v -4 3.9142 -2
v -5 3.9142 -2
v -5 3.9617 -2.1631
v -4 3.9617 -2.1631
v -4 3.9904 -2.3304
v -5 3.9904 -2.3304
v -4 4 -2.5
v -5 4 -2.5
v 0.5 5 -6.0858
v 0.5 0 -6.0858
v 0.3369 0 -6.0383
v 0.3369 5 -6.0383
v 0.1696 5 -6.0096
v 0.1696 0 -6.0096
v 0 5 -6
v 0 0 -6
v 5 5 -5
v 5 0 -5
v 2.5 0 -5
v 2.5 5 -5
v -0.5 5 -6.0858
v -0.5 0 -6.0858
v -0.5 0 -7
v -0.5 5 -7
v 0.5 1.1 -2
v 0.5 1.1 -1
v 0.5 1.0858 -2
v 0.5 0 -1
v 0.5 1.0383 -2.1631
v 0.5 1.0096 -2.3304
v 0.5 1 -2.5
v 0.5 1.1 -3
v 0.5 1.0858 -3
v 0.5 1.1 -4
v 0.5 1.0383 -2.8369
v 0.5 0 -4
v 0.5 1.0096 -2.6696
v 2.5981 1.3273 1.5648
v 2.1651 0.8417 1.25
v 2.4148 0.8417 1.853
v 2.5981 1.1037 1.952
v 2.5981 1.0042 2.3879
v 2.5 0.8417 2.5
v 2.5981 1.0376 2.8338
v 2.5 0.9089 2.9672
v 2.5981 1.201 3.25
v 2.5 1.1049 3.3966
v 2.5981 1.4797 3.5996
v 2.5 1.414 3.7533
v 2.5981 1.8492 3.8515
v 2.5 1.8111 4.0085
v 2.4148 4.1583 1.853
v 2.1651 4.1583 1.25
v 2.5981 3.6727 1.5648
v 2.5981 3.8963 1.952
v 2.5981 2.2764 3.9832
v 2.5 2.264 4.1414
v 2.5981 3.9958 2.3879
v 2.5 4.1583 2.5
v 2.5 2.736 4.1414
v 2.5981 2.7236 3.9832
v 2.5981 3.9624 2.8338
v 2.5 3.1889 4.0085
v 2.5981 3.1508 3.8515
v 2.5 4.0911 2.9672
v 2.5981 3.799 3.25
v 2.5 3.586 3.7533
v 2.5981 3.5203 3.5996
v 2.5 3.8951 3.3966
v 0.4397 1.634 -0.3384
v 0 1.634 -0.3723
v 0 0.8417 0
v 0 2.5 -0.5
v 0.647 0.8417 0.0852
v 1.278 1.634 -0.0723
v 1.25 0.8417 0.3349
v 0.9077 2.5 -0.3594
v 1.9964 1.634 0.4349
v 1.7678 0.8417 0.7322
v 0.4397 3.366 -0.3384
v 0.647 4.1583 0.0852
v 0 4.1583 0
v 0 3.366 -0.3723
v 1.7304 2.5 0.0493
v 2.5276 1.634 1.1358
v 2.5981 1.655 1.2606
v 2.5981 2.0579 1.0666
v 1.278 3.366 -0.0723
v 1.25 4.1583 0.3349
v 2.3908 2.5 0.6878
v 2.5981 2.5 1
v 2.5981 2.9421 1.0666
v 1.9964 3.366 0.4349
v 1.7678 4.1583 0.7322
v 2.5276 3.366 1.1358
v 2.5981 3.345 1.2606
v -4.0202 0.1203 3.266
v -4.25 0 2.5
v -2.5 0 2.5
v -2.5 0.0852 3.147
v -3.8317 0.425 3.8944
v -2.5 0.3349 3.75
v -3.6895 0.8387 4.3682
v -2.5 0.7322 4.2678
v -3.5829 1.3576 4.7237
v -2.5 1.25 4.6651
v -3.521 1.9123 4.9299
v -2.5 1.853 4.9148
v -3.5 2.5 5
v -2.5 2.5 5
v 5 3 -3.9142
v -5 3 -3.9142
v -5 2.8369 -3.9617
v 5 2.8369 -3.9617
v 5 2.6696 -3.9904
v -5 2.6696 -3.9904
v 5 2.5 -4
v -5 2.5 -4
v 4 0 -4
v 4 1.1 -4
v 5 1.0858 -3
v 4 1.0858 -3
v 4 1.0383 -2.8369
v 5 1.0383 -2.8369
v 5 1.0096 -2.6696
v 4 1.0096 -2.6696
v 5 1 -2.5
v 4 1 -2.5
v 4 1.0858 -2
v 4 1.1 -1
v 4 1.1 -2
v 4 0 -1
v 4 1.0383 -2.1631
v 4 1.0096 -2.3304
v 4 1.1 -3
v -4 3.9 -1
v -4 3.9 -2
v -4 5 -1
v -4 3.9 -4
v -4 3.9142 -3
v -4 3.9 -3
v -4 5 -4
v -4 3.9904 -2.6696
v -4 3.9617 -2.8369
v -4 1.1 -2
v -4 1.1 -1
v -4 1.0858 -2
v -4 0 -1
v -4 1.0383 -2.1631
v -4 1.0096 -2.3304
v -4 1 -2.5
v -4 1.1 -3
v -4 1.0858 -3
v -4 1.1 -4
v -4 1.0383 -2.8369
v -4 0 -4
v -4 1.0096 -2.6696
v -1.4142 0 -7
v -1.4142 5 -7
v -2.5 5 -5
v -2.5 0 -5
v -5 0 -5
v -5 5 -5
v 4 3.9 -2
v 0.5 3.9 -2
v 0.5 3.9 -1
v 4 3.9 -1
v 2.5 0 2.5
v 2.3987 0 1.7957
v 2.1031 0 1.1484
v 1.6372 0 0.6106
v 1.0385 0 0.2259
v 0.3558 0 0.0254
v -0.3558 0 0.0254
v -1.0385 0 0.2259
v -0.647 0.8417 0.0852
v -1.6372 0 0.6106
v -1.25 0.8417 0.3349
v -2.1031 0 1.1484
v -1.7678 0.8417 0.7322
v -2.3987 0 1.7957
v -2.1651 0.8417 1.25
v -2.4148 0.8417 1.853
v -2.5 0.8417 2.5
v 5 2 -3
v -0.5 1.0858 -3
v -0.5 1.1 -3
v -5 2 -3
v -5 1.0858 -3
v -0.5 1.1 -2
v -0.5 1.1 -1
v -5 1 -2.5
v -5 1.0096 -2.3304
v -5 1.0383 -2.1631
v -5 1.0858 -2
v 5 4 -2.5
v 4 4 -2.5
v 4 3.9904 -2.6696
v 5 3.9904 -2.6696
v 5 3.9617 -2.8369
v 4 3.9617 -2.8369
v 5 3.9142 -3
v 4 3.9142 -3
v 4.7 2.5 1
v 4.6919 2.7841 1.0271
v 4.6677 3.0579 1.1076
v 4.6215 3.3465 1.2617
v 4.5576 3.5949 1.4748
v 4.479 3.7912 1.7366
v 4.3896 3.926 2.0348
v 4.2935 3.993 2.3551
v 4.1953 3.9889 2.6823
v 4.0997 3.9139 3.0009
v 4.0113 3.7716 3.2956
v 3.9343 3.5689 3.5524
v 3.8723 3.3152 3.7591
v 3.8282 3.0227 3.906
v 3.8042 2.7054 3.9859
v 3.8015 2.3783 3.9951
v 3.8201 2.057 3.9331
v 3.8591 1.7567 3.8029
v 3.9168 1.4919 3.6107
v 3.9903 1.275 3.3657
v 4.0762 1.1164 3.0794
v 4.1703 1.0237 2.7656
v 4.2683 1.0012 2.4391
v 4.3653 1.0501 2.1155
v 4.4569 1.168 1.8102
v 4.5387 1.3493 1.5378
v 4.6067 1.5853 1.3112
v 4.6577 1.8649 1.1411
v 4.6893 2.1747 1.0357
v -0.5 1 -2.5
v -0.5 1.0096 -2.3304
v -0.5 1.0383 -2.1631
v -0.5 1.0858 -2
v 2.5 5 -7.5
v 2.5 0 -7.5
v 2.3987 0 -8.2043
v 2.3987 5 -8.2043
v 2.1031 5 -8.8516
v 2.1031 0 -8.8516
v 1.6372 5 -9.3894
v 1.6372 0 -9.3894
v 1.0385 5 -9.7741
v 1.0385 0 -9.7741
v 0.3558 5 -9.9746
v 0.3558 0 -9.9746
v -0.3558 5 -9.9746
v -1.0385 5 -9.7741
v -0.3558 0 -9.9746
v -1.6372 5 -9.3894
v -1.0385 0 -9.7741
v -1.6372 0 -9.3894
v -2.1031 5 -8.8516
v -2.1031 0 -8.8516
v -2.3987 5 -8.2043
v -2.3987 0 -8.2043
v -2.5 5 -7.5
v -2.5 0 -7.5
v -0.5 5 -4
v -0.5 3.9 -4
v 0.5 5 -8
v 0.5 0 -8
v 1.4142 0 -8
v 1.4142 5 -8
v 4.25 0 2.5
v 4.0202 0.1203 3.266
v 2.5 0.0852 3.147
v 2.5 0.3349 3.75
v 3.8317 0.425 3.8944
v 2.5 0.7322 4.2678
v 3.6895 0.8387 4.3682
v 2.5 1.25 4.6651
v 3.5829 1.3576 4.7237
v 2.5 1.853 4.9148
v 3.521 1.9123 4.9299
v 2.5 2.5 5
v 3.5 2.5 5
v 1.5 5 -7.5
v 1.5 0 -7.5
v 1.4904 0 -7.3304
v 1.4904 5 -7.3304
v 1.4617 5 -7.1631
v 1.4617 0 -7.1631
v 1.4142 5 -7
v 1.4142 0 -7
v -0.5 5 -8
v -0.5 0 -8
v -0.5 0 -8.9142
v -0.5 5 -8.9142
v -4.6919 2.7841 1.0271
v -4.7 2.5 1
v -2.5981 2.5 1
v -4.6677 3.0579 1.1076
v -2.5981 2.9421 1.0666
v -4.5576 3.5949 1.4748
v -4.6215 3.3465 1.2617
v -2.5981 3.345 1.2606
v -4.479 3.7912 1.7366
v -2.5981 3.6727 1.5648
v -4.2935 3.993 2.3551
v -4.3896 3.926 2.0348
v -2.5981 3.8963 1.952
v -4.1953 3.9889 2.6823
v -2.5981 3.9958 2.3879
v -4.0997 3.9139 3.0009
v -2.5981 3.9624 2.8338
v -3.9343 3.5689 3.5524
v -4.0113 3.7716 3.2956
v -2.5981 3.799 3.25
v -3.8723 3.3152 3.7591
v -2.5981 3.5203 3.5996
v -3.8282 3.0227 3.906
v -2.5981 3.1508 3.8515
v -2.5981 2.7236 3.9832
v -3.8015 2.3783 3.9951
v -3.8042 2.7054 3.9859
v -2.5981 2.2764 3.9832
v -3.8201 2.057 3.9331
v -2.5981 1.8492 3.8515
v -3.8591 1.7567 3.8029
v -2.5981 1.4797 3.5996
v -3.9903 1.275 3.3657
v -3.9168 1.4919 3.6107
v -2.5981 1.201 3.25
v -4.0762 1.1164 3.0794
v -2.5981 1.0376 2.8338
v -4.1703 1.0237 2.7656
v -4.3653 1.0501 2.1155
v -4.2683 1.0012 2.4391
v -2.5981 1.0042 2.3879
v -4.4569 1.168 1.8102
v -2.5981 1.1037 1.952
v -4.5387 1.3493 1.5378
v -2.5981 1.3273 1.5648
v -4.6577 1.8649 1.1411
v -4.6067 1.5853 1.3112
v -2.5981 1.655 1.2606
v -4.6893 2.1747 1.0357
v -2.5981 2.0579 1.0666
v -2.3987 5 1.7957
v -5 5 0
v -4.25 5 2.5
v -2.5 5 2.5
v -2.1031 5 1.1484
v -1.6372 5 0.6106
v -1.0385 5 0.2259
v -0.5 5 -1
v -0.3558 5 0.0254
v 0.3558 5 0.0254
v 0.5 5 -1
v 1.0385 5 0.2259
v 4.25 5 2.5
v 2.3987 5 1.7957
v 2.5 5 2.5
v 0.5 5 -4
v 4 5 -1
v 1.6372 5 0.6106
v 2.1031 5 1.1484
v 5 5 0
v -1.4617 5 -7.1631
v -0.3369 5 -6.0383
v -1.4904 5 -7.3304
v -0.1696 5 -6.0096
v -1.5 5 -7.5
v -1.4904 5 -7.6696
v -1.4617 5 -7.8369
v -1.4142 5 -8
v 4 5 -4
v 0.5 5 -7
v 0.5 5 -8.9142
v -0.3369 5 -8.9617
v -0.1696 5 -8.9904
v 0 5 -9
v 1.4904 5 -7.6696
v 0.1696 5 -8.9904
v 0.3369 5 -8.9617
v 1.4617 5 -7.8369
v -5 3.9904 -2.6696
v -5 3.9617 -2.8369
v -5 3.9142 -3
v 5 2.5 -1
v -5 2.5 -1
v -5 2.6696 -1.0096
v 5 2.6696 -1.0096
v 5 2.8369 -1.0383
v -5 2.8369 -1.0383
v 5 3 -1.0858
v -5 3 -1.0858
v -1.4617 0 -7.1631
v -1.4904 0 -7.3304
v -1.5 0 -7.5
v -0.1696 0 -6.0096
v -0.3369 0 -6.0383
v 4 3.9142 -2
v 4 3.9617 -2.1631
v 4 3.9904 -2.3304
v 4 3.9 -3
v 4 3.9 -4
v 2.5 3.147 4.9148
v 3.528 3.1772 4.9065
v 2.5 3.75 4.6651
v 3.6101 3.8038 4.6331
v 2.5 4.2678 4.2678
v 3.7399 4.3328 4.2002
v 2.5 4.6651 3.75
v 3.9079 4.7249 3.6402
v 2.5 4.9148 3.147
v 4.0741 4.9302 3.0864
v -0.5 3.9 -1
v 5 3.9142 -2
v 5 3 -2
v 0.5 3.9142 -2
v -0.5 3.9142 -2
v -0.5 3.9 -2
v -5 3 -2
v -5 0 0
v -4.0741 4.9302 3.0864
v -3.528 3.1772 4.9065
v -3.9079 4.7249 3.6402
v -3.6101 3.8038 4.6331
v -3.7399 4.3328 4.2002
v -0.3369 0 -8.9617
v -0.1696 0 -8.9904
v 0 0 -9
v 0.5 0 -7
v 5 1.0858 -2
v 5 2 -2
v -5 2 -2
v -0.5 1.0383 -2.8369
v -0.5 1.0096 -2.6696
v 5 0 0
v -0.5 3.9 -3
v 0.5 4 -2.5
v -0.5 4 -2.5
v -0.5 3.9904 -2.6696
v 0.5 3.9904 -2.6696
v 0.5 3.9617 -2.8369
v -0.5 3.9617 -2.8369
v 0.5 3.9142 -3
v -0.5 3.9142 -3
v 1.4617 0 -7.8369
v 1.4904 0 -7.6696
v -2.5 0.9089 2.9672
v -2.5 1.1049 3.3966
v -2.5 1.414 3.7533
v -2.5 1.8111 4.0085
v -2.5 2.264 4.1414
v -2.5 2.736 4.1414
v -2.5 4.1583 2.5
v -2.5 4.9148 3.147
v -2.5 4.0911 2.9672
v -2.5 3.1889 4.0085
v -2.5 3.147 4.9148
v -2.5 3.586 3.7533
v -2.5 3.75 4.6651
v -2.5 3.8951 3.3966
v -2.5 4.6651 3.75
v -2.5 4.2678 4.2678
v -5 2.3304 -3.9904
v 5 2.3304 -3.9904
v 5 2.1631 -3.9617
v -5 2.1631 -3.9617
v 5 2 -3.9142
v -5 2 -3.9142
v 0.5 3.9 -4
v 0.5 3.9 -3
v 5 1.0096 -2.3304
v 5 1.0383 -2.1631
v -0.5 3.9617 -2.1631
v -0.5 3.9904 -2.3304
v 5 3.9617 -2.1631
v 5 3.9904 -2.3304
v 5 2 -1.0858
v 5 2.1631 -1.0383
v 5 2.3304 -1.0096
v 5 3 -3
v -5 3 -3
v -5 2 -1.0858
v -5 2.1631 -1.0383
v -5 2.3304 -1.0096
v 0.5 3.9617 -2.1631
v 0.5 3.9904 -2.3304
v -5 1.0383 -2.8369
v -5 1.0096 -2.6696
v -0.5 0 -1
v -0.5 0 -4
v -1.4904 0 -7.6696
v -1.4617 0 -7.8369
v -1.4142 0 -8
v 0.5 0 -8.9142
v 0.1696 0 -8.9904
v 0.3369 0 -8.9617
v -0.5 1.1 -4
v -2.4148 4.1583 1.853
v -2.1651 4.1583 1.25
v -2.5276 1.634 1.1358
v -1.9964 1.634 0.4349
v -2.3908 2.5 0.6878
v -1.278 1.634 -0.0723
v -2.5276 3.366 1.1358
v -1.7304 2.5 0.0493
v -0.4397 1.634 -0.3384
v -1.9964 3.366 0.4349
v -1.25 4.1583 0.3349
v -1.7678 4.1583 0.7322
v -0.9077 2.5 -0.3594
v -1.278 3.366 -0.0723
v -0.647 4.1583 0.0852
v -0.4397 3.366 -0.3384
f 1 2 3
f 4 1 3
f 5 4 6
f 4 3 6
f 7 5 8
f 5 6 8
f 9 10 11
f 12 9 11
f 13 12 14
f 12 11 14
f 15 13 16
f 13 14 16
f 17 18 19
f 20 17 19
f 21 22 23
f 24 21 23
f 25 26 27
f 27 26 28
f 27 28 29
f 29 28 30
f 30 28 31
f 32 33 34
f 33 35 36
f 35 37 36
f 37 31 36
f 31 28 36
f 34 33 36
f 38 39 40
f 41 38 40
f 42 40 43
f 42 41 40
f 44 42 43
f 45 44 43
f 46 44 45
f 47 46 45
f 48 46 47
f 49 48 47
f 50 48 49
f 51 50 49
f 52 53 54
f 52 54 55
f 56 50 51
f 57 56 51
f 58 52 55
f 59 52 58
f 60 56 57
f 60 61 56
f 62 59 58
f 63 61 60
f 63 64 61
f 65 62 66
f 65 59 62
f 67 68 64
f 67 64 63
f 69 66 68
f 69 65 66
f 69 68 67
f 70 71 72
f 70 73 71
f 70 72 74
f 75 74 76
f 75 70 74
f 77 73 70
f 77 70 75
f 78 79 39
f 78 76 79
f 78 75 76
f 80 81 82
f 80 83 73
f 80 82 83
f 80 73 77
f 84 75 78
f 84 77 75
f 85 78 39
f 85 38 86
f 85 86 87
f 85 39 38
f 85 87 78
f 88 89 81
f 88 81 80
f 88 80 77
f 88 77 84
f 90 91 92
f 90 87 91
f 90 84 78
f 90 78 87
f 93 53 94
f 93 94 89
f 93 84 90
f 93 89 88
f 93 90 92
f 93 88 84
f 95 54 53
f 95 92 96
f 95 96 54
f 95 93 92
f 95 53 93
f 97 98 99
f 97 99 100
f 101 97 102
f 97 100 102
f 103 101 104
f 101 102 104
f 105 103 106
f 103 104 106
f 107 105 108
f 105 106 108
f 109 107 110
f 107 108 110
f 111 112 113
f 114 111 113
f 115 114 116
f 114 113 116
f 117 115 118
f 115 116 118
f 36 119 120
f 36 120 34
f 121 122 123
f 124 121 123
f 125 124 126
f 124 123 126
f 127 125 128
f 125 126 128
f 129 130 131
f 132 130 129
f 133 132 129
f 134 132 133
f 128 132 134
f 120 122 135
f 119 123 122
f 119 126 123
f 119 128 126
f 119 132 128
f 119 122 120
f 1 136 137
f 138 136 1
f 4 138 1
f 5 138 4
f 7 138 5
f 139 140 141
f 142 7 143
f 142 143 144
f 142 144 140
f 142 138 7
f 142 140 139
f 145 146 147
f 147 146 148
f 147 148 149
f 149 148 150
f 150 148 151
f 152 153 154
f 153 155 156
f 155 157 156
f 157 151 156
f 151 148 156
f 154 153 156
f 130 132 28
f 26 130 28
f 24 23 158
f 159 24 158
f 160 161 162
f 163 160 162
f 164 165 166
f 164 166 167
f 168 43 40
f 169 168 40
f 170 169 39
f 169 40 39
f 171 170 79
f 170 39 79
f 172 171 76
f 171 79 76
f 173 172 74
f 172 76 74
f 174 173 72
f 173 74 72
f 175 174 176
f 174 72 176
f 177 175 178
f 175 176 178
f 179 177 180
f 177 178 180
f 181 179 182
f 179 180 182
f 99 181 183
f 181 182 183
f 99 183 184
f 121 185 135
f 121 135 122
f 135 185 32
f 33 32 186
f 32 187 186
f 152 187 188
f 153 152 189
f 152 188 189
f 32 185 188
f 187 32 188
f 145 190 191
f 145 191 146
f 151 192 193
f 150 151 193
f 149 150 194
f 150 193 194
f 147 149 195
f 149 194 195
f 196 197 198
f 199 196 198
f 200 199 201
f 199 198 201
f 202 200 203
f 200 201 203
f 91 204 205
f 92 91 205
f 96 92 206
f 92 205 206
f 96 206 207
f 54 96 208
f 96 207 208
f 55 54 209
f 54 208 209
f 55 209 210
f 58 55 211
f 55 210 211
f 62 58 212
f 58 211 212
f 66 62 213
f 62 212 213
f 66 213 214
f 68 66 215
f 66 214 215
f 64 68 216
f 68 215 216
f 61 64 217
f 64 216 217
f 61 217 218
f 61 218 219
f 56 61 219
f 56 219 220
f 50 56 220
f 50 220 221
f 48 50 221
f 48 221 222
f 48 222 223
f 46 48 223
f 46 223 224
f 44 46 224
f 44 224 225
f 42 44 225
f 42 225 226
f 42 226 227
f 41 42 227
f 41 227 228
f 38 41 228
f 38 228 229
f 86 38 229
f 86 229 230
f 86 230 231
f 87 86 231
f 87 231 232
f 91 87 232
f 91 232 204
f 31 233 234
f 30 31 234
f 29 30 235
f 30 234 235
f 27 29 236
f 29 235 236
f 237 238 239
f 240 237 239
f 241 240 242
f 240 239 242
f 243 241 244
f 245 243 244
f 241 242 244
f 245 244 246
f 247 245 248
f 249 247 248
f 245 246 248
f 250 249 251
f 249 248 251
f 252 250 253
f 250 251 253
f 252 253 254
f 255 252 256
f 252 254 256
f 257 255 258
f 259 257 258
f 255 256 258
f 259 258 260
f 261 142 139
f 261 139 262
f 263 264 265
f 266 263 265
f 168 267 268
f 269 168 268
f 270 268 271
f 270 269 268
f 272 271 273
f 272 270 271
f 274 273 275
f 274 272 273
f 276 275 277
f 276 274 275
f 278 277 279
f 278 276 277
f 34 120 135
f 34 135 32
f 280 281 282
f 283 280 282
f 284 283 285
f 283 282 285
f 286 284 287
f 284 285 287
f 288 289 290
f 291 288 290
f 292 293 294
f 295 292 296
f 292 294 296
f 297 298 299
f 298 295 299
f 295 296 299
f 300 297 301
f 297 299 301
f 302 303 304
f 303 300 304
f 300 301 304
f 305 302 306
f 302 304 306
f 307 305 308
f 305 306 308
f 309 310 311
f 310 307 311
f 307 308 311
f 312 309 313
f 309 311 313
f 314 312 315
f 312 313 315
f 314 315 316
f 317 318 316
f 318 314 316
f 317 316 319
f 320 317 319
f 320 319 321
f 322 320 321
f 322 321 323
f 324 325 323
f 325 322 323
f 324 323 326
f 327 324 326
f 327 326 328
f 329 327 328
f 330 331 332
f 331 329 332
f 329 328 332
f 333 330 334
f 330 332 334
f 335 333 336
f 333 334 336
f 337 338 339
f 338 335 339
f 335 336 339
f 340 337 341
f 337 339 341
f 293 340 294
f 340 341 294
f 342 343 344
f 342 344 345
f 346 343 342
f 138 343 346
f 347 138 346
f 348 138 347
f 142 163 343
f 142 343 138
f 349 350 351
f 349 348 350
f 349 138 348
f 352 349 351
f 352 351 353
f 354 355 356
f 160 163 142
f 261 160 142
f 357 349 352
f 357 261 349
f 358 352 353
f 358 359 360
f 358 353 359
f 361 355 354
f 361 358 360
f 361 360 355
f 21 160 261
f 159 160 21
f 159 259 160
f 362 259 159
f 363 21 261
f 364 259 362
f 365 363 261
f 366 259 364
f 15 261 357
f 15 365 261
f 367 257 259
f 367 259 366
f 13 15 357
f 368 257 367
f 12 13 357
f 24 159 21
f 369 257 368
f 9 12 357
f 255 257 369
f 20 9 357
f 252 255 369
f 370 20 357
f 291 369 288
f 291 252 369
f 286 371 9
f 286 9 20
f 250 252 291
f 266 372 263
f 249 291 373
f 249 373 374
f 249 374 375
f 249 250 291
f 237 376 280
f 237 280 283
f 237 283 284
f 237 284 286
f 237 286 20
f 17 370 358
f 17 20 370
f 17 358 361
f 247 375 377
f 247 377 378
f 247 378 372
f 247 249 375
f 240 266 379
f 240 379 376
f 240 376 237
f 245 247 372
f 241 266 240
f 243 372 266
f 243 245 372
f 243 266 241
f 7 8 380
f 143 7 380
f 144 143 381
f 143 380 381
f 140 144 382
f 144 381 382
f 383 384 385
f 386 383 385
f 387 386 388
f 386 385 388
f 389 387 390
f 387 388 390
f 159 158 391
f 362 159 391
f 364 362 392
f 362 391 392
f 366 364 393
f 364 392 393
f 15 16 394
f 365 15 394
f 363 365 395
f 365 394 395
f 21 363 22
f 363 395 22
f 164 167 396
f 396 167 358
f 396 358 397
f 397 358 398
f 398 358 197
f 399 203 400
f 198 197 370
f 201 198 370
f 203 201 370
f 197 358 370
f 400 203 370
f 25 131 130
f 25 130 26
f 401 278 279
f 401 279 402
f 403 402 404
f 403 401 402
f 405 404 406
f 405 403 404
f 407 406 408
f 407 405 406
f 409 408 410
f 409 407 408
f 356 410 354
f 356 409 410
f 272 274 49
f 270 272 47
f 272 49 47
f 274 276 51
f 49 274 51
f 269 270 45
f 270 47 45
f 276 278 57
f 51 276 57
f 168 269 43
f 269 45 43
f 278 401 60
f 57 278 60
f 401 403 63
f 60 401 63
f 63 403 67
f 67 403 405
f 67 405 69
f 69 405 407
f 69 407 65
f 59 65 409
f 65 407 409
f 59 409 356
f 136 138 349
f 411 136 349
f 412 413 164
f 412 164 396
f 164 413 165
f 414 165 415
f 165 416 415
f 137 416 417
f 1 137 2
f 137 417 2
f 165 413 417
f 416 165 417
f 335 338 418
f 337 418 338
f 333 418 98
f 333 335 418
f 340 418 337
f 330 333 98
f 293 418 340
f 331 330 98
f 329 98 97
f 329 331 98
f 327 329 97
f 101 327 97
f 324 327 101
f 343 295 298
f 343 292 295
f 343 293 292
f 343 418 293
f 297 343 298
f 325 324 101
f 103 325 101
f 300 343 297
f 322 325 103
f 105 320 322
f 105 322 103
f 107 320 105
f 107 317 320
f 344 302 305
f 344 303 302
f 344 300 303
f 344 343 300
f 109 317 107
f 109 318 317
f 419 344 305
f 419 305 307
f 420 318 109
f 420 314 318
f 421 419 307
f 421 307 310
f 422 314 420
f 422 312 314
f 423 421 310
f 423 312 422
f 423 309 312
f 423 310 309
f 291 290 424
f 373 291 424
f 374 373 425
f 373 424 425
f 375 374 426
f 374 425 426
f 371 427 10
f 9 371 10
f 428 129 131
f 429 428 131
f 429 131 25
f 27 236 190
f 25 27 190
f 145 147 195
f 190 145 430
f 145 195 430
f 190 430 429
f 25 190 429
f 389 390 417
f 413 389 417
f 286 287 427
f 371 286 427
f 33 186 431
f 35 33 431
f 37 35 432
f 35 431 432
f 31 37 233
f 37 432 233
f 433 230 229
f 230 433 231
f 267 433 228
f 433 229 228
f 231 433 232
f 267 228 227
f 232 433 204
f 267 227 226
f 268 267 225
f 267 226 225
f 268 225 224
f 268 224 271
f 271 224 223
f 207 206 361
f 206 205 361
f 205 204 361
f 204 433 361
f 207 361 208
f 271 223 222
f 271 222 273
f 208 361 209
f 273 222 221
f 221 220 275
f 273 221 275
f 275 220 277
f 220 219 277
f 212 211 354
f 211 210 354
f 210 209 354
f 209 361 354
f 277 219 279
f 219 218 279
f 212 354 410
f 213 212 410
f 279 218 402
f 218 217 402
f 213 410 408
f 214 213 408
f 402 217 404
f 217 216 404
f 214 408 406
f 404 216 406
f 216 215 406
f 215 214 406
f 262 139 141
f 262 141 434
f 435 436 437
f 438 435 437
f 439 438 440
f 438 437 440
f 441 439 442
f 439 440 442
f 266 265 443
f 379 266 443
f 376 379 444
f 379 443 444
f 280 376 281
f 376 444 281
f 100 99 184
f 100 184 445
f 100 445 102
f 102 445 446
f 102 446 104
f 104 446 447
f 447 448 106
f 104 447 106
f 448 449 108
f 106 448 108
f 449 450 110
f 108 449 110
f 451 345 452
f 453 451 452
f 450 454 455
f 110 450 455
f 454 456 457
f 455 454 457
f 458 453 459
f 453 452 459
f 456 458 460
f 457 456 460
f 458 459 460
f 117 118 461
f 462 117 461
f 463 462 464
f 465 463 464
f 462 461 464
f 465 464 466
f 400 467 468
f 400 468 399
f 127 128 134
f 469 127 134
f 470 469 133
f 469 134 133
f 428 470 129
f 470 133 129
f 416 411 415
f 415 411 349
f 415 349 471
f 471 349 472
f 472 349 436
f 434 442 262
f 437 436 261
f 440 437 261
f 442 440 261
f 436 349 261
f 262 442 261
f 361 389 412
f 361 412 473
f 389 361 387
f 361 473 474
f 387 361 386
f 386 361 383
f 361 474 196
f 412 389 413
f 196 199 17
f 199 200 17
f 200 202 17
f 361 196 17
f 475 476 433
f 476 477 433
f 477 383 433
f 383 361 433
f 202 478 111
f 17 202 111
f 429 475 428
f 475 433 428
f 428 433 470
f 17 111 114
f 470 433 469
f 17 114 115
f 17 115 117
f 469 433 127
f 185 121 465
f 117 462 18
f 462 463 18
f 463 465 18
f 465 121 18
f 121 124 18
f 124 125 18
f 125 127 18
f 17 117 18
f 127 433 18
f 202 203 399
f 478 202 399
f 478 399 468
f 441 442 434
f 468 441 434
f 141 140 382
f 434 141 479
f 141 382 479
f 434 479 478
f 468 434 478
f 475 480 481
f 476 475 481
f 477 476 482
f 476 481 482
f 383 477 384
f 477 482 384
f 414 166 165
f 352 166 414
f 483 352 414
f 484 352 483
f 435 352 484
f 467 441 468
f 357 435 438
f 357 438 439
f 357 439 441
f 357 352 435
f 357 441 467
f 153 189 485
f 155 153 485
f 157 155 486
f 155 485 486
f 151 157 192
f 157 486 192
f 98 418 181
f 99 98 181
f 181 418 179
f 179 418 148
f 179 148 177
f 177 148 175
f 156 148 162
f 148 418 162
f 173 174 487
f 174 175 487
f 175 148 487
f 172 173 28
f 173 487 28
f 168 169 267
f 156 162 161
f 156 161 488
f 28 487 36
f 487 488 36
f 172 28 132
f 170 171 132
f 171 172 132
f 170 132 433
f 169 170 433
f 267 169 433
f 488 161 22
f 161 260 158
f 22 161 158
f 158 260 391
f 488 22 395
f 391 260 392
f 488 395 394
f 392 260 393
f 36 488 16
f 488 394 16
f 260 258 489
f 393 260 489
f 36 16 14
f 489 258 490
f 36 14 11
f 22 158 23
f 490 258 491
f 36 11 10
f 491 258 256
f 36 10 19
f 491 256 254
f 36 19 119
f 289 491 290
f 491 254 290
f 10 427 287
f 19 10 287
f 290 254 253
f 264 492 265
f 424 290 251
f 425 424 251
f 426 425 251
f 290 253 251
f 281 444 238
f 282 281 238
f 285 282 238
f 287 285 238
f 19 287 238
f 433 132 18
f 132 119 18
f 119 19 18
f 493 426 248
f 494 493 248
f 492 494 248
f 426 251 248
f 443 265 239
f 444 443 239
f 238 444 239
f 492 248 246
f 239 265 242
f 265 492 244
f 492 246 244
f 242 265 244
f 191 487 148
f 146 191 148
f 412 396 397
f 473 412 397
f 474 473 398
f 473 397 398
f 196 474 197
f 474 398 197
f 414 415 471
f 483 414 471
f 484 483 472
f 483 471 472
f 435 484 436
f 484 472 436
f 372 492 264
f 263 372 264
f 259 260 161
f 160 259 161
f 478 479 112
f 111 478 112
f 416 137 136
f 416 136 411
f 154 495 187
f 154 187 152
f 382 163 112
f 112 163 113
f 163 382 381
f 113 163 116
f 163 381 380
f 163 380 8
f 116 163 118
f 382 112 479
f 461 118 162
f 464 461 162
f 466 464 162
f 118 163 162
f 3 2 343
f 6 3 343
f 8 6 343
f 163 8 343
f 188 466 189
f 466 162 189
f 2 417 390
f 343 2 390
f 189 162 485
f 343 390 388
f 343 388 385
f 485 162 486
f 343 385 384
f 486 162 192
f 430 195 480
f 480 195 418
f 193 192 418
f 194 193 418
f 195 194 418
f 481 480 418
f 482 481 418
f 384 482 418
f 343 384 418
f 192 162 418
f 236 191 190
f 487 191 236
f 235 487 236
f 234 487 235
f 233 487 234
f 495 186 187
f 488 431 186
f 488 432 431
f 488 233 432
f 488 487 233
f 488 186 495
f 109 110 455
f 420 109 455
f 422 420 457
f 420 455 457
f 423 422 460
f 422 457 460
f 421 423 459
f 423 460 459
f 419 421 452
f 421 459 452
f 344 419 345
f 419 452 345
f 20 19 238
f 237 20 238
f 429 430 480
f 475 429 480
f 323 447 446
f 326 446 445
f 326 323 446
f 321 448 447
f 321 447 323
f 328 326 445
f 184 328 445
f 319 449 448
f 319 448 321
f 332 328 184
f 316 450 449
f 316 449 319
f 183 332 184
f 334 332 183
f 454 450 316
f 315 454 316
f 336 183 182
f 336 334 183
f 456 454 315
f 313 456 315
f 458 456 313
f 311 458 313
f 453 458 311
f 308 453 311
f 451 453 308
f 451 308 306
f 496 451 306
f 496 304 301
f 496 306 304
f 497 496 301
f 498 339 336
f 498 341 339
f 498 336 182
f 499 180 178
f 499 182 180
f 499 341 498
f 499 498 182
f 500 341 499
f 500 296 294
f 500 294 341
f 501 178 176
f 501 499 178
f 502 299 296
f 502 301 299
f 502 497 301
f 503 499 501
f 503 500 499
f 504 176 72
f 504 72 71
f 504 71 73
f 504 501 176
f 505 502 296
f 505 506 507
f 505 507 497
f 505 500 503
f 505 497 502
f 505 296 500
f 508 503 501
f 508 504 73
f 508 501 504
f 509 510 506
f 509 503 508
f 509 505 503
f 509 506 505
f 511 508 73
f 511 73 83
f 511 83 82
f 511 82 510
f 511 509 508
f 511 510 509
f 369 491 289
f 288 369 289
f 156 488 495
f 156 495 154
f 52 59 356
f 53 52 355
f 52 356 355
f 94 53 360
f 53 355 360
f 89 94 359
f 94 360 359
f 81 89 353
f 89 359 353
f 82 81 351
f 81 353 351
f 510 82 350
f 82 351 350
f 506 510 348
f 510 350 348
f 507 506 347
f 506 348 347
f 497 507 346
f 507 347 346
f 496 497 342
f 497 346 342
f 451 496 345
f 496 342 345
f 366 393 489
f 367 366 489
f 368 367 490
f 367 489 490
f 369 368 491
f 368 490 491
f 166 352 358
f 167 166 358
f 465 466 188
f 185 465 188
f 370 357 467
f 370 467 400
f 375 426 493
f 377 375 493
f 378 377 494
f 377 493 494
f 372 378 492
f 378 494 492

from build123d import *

# Parameters (mm, degrees)
BOSS_EXTRUDE1_DEPTH     = 5
SKETCH3_R               = 1.5
CUT_EXTRUDE1_DEPTH      = 10
CUT_EXTRUDE2_REACH      = 7
CUT_EXTRUDE4_DEPTH      = 10
CUT_EXTRUDE5_DEPTH      = 10
CUT_EXTRUDE5_DEPTH_BACK = 10
CUT_EXTRUDE6_DEPTH      = 10
SKETCH8_W               = 3.5
SKETCH8_H               = 3
CUT_EXTRUDE13_DEPTH     = 1.1
SKETCH9_W               = 3.5
SKETCH9_H               = 3
CUT_EXTRUDE14_DEPTH     = 1.1


with BuildPart() as part:
    # Sketch1 → Boss-Extrude1 (new body)
    with BuildSketch(Plane(origin=(0, 0, 0), x_dir=(1, 0, 0), z_dir=(0, 1, 0))):
        Polygon((-5, 5), (-5, -5), (5, -5), (5, 5), (2.5, 5), (1e-09, 5), (-2.5, 5), align=None)
        with BuildLine():
            Line((-2.5, 7.5), (-2.5, 5))
            Line((-2.5, 5), (1e-09, 5))
            ThreePointArc((1e-09, 5), (-1.767766953, 5.732233047), (-2.5, 7.5))
        make_face()
        with BuildLine():
            Line((1e-09, 5), (2.5, 5))
            Line((2.5, 5), (2.5, 7.5))
            ThreePointArc((2.5, 7.5), (1.767766953, 5.732233047), (1e-09, 5))
        make_face()
        with BuildLine():
            ThreePointArc((2.5, 7.5), (0, 10), (-2.5, 7.5))
            Line((-2.5, 7.5), (-1.5, 7.5))
            Line((-1.5, 7.499999998), (-1.5, 8))
            Line((-1.5, 8), (-1.414213562, 8))
            ThreePointArc((-1.414213562, 8), (-1.060660172, 8.560660172), (-0.5, 8.914213562))
            Line((-0.5, 8.914213562), (-0.5, 9))
            Line((-0.5, 9), (-1.7e-08, 9))
            Line((-1.7e-08, 9), (0.5, 9))
            Line((0.5, 9), (0.5, 8.914213562))
            ThreePointArc((0.5, 8.914213562), (1.060660172, 8.560660172), (1.414213562, 8))
            Line((1.414213562, 8), (1.5, 8))
            Line((1.5, 8), (1.5, 7.5))
            Line((1.5, 7.5), (2.5, 7.5))
        make_face()
        with BuildLine():
            ThreePointArc((-2.5, 7.5), (-1.767766953, 5.732233047), (1e-09, 5))
            ThreePointArc((1e-09, 5), (1.767766953, 5.732233047), (2.5, 7.5))
            Line((2.5, 7.5), (1.5, 7.5))
            Line((1.5, 7.5), (1.5, 7))
            Line((1.5, 7), (1.414213562, 7))
            ThreePointArc((1.414213562, 7), (1.060660172, 6.439339828), (0.5, 6.085786438))
            Line((0.5, 6.085786438), (0.5, 6))
            Line((0.5, 6), (0, 6))
            Line((0, 6), (-0.5, 6))
            Line((-0.5, 6), (-0.5, 6.085786438))
            ThreePointArc((-0.5, 6.085786438), (-1.060660172, 6.439339828), (-1.414213562, 7))
            Line((-1.414213562, 7), (-1.5, 7))
            Line((-1.5, 7), (-1.5, 7.499999998))
            Line((-1.5, 7.5), (-2.5, 7.5))
        make_face()
        with BuildLine():
            Line((0.5, 6), (0.5, 6.085786438))
            ThreePointArc((0.5, 6.085786438), (0.253652968, 6.021602161), (0, 6))
            Line((0, 6), (0.5, 6))
        make_face()
        with BuildLine():
            Line((-0.5, 7), (-1.414213562, 7))
            ThreePointArc((-1.414213562, 7), (-1.060660172, 6.439339828), (-0.5, 6.085786438))
            Line((-0.5, 6.085786438), (-0.5, 7))
        make_face()
        with BuildLine():
            ThreePointArc((0.5, 6.085786438), (1.060660172, 6.439339828), (1.414213562, 7))
            Line((1.414213562, 7), (0.5, 7))
            Line((0.5, 7), (0.5, 6.085786438))
        make_face()
        with BuildLine():
            Line((0.5, 8), (1.414213562, 8))
            ThreePointArc((1.414213562, 8), (1.060660172, 8.560660172), (0.5, 8.914213562))
            Line((0.5, 8.914213562), (0.5, 8))
        make_face()
        with BuildLine():
            ThreePointArc((-0.5, 8.914213562), (-1.060660172, 8.560660172), (-1.414213562, 8))
            Line((-1.414213562, 8), (-0.5, 8))
            Line((-0.5, 8), (-0.5, 8.914213562))
        make_face()
        with BuildLine():
            Line((-0.5, 9), (-0.5, 8.914213562))
            ThreePointArc((-0.5, 8.914213562), (-0.253652976, 8.978397838), (-1.7e-08, 9))
            Line((-1.7e-08, 9), (-0.5, 9))
        make_face()
        with BuildLine():
            ThreePointArc((-1.7e-08, 9), (0.25365296, 8.978397841), (0.5, 8.914213562))
            Line((0.5, 8.914213562), (0.5, 9))
            Line((0.5, 9), (-1.7e-08, 9))
        make_face()
        with BuildLine():
            ThreePointArc((-1.414213562, 7), (-1.478397839, 7.246347031), (-1.5, 7.499999998))
            Line((-1.5, 7.499999998), (-1.5, 7))
            Line((-1.5, 7), (-1.414213562, 7))
        make_face()
        with BuildLine():
            ThreePointArc((0, 6), (-0.253652968, 6.021602161), (-0.5, 6.085786438))
            Line((-0.5, 6.085786438), (-0.5, 6))
            Line((-0.5, 6), (0, 6))
        make_face()
        with BuildLine():
            Line((-1.5, 8), (-1.5, 7.499999998))
            ThreePointArc((-1.5, 7.499999998), (-1.47839784, 7.753652967), (-1.414213562, 8))
            Line((-1.414213562, 8), (-1.5, 8))
        make_face()
        with BuildLine():
            Line((1.5, 7), (1.5, 7.5))
            ThreePointArc((1.5, 7.5), (1.478397839, 7.246347032), (1.414213562, 7))
            Line((1.414213562, 7), (1.5, 7))
        make_face()
        with BuildLine():
            ThreePointArc((1.414213562, 8), (1.478397839, 7.753652968), (1.5, 7.5))
            Line((1.5, 7.5), (1.5, 8))
            Line((1.5, 8), (1.414213562, 8))
        make_face()
    extrude(amount=BOSS_EXTRUDE1_DEPTH)

    # Sketch2 → Cut-Revolve3 (revolve, cut)
    with BuildSketch(Plane(origin=(0, 0, 0), x_dir=(0, 0, -1), z_dir=(1, 0, 0))):
        with BuildLine():
            Line((-2.5, 5.5), (-2.5, -0.5))
            ThreePointArc((-2.5, -0.5), (0.5, 2.5), (-2.5, 5.5))
        make_face()
    revolve(axis=Axis((0, 5.5, 2.5), (0, -1, 0)), mode=Mode.SUBTRACT)

    # Sketch3 → Cut-Extrude1 (cut)
    with BuildSketch(Plane(origin=(5, 0, 0), x_dir=(0, 0, -1), z_dir=(1, 0, 0))):
        with Locations((-2.5, 2.5)):
            Circle(SKETCH3_R)
    extrude(amount=-CUT_EXTRUDE1_DEPTH, mode=Mode.SUBTRACT)

    # Sketch4 → Cut-Extrude2 (cut, up to next)
    with BuildSketch(Plane(origin=(0, 5, 0), x_dir=(1, 0, 0), z_dir=(0, 1, 0)), mode=Mode.PRIVATE) as cut_extrude2_sk1:
        Polygon((-5, 0), (-3.5, -5), (-5, -5), align=None)
    cut_extrude2_tool1 = extrude(cut_extrude2_sk1.sketch, amount=-CUT_EXTRUDE2_REACH, mode=Mode.PRIVATE) & part.part
    add(cut_extrude2_tool1.solids().sort_by_distance((-4.5, 5, 3.333333))[0], mode=Mode.SUBTRACT)
    # Sketch4 → Cut-Extrude2 (cut, up to next)
    with BuildSketch(Plane(origin=(0, 5, 0), x_dir=(1, 0, 0), z_dir=(0, 1, 0)), mode=Mode.PRIVATE) as cut_extrude2_sk2:
        Polygon((5, 0), (3.5, -5), (5, -5), align=None)
    cut_extrude2_tool2 = extrude(cut_extrude2_sk2.sketch, amount=-CUT_EXTRUDE2_REACH, mode=Mode.PRIVATE) & part.part
    add(cut_extrude2_tool2.solids().sort_by_distance((4.5, 5, 3.333333))[0], mode=Mode.SUBTRACT)

    # Sketch5 → Cut-Extrude4 (cut)
    with BuildSketch(Plane(origin=(0, 5, 0), x_dir=(1, 0, 0), z_dir=(0, 1, 0))):
        with BuildLine():
            ThreePointArc((-1.658312395, -2.5), (0, -0.841687605), (1.658312395, -2.5))
            Line((1.658312395, -2.5), (2.5, -2.5))
            ThreePointArc((2.5, -2.5), (0, 0), (-2.5, -2.5))
            Line((-2.5, -2.5), (-1.658312395, -2.5))
        make_face()
        with BuildLine():
            Line((2.5, -2.5), (1.658312395, -2.5))
            ThreePointArc((1.658312395, -2.5), (0, -4.158312395), (-1.658312395, -2.5))
            Line((-1.658312395, -2.5), (-2.5, -2.5))
            ThreePointArc((-2.5, -2.5), (-1.767766953, -4.267766953), (0, -5))
            ThreePointArc((0, -5), (1.767766953, -4.267766953), (2.5, -2.5))
        make_face()
        with BuildLine():
            Line((2.5, -5), (2.5, -2.5))
            ThreePointArc((2.5, -2.5), (1.767766953, -4.267766953), (0, -5))
            Line((0, -5), (2.5, -5))
        make_face()
        with BuildLine():
            ThreePointArc((0, -5), (-1.767766953, -4.267766953), (-2.5, -2.5))
            Line((-2.5, -2.5), (-2.5, -5))
            Line((-2.5, -5), (0, -5))
        make_face()
    extrude(amount=-CUT_EXTRUDE4_DEPTH, mode=Mode.SUBTRACT)

    # Sketch6 → Cut-Extrude5 (cut, two sides)
    with BuildSketch(Plane(origin=(-2.5, 0, 0), x_dir=(0, 0, -1), z_dir=(1, 0, 0))) as cut_extrude5_sk:
        with BuildLine():
            ThreePointArc((-5, 2.5), (-4.267766953, 4.267766953), (-2.5, 5))
            Line((-2.5, 5), (-5, 5))
            Line((-5, 5), (-5, 2.5))
        make_face()
        with BuildLine():
            Line((-5, 0), (-2.5, 0))
            ThreePointArc((-2.5, 0), (-4.267766953, 0.732233047), (-5, 2.5))
            Line((-5, 2.5), (-5, 0))
        make_face()
    extrude(amount=CUT_EXTRUDE5_DEPTH, mode=Mode.SUBTRACT)
    extrude(cut_extrude5_sk.sketch, amount=-CUT_EXTRUDE5_DEPTH_BACK, mode=Mode.SUBTRACT)

    # Sketch7 → Cut-Extrude6 (cut)
    with BuildSketch(Plane.ZY.offset(5)):
        with BuildLine():
            Line((-3.914213562, 2), (-3, 2))
            Line((-3, 2), (-3, 3))
            Line((-3, 3), (-3.914213562, 3))
            ThreePointArc((-3.914213562, 3), (-3.978397839, 2.753652968), (-4, 2.5))
            ThreePointArc((-4, 2.5), (-3.978397839, 2.246347032), (-3.914213562, 2))
        make_face()
        Polygon((-3, 3), (-3, 2), (-2, 3), align=None)
        with BuildLine():
            Line((-3, 3), (-2, 3))
            Line((-2, 3), (-2, 3.914213562))
            ThreePointArc((-2, 3.914213562), (-2.246347032, 3.978397839), (-2.5, 4))
            ThreePointArc((-2.5, 4), (-2.753652968, 3.978397839), (-3, 3.914213562))
            Line((-3, 3.914213562), (-3, 3))
        make_face()
        Polygon((-2, 3), (-3, 2), (-2, 2), align=None)
        with BuildLine():
            Line((-1.085786438, 3), (-2, 3))
            Line((-2, 3), (-2, 2))
            Line((-2, 2), (-1.085786438, 2))
            ThreePointArc((-1.085786438, 2), (-1.021602161, 2.246347032), (-1, 2.5))
            ThreePointArc((-1, 2.5), (-1.021602161, 2.753652968), (-1.085786438, 3))
        make_face()
        with BuildLine():
            Line((-2, 2), (-3, 2))
            Line((-3, 2), (-3, 1.085786438))
            ThreePointArc((-3, 1.085786438), (-2.753652968, 1.021602161), (-2.5, 1))
            ThreePointArc((-2.5, 1), (-2.246347032, 1.021602161), (-2, 1.085786438))
            Line((-2, 1.085786438), (-2, 2))
        make_face()
    extrude(amount=-CUT_EXTRUDE6_DEPTH, mode=Mode.SUBTRACT)

    # Sketch8 → Cut-Extrude13 (cut)
    with BuildSketch(Plane(origin=(0, 5, 0), x_dir=(1, 0, 0), z_dir=(0, 1, 0))):
        with Locations((2.25, 2.5)):
            Rectangle(SKETCH8_W, SKETCH8_H)
        with Locations((-2.25, 2.5)):
            Rectangle(SKETCH8_W, SKETCH8_H)
    extrude(amount=-CUT_EXTRUDE13_DEPTH, mode=Mode.SUBTRACT)

    # Sketch9 → Cut-Extrude14 (cut)
    with BuildSketch(Plane(origin=(0, 0, 0), x_dir=(-1, 0, 0), z_dir=(0, -1, 0))):
        with Locations((-2.25, 2.5)):
            Rectangle(SKETCH9_W, SKETCH9_H)
        with Locations((2.25, 2.5)):
            Rectangle(SKETCH9_W, SKETCH9_H)
    extrude(amount=-CUT_EXTRUDE14_DEPTH, mode=Mode.SUBTRACT)


solid = part.part
